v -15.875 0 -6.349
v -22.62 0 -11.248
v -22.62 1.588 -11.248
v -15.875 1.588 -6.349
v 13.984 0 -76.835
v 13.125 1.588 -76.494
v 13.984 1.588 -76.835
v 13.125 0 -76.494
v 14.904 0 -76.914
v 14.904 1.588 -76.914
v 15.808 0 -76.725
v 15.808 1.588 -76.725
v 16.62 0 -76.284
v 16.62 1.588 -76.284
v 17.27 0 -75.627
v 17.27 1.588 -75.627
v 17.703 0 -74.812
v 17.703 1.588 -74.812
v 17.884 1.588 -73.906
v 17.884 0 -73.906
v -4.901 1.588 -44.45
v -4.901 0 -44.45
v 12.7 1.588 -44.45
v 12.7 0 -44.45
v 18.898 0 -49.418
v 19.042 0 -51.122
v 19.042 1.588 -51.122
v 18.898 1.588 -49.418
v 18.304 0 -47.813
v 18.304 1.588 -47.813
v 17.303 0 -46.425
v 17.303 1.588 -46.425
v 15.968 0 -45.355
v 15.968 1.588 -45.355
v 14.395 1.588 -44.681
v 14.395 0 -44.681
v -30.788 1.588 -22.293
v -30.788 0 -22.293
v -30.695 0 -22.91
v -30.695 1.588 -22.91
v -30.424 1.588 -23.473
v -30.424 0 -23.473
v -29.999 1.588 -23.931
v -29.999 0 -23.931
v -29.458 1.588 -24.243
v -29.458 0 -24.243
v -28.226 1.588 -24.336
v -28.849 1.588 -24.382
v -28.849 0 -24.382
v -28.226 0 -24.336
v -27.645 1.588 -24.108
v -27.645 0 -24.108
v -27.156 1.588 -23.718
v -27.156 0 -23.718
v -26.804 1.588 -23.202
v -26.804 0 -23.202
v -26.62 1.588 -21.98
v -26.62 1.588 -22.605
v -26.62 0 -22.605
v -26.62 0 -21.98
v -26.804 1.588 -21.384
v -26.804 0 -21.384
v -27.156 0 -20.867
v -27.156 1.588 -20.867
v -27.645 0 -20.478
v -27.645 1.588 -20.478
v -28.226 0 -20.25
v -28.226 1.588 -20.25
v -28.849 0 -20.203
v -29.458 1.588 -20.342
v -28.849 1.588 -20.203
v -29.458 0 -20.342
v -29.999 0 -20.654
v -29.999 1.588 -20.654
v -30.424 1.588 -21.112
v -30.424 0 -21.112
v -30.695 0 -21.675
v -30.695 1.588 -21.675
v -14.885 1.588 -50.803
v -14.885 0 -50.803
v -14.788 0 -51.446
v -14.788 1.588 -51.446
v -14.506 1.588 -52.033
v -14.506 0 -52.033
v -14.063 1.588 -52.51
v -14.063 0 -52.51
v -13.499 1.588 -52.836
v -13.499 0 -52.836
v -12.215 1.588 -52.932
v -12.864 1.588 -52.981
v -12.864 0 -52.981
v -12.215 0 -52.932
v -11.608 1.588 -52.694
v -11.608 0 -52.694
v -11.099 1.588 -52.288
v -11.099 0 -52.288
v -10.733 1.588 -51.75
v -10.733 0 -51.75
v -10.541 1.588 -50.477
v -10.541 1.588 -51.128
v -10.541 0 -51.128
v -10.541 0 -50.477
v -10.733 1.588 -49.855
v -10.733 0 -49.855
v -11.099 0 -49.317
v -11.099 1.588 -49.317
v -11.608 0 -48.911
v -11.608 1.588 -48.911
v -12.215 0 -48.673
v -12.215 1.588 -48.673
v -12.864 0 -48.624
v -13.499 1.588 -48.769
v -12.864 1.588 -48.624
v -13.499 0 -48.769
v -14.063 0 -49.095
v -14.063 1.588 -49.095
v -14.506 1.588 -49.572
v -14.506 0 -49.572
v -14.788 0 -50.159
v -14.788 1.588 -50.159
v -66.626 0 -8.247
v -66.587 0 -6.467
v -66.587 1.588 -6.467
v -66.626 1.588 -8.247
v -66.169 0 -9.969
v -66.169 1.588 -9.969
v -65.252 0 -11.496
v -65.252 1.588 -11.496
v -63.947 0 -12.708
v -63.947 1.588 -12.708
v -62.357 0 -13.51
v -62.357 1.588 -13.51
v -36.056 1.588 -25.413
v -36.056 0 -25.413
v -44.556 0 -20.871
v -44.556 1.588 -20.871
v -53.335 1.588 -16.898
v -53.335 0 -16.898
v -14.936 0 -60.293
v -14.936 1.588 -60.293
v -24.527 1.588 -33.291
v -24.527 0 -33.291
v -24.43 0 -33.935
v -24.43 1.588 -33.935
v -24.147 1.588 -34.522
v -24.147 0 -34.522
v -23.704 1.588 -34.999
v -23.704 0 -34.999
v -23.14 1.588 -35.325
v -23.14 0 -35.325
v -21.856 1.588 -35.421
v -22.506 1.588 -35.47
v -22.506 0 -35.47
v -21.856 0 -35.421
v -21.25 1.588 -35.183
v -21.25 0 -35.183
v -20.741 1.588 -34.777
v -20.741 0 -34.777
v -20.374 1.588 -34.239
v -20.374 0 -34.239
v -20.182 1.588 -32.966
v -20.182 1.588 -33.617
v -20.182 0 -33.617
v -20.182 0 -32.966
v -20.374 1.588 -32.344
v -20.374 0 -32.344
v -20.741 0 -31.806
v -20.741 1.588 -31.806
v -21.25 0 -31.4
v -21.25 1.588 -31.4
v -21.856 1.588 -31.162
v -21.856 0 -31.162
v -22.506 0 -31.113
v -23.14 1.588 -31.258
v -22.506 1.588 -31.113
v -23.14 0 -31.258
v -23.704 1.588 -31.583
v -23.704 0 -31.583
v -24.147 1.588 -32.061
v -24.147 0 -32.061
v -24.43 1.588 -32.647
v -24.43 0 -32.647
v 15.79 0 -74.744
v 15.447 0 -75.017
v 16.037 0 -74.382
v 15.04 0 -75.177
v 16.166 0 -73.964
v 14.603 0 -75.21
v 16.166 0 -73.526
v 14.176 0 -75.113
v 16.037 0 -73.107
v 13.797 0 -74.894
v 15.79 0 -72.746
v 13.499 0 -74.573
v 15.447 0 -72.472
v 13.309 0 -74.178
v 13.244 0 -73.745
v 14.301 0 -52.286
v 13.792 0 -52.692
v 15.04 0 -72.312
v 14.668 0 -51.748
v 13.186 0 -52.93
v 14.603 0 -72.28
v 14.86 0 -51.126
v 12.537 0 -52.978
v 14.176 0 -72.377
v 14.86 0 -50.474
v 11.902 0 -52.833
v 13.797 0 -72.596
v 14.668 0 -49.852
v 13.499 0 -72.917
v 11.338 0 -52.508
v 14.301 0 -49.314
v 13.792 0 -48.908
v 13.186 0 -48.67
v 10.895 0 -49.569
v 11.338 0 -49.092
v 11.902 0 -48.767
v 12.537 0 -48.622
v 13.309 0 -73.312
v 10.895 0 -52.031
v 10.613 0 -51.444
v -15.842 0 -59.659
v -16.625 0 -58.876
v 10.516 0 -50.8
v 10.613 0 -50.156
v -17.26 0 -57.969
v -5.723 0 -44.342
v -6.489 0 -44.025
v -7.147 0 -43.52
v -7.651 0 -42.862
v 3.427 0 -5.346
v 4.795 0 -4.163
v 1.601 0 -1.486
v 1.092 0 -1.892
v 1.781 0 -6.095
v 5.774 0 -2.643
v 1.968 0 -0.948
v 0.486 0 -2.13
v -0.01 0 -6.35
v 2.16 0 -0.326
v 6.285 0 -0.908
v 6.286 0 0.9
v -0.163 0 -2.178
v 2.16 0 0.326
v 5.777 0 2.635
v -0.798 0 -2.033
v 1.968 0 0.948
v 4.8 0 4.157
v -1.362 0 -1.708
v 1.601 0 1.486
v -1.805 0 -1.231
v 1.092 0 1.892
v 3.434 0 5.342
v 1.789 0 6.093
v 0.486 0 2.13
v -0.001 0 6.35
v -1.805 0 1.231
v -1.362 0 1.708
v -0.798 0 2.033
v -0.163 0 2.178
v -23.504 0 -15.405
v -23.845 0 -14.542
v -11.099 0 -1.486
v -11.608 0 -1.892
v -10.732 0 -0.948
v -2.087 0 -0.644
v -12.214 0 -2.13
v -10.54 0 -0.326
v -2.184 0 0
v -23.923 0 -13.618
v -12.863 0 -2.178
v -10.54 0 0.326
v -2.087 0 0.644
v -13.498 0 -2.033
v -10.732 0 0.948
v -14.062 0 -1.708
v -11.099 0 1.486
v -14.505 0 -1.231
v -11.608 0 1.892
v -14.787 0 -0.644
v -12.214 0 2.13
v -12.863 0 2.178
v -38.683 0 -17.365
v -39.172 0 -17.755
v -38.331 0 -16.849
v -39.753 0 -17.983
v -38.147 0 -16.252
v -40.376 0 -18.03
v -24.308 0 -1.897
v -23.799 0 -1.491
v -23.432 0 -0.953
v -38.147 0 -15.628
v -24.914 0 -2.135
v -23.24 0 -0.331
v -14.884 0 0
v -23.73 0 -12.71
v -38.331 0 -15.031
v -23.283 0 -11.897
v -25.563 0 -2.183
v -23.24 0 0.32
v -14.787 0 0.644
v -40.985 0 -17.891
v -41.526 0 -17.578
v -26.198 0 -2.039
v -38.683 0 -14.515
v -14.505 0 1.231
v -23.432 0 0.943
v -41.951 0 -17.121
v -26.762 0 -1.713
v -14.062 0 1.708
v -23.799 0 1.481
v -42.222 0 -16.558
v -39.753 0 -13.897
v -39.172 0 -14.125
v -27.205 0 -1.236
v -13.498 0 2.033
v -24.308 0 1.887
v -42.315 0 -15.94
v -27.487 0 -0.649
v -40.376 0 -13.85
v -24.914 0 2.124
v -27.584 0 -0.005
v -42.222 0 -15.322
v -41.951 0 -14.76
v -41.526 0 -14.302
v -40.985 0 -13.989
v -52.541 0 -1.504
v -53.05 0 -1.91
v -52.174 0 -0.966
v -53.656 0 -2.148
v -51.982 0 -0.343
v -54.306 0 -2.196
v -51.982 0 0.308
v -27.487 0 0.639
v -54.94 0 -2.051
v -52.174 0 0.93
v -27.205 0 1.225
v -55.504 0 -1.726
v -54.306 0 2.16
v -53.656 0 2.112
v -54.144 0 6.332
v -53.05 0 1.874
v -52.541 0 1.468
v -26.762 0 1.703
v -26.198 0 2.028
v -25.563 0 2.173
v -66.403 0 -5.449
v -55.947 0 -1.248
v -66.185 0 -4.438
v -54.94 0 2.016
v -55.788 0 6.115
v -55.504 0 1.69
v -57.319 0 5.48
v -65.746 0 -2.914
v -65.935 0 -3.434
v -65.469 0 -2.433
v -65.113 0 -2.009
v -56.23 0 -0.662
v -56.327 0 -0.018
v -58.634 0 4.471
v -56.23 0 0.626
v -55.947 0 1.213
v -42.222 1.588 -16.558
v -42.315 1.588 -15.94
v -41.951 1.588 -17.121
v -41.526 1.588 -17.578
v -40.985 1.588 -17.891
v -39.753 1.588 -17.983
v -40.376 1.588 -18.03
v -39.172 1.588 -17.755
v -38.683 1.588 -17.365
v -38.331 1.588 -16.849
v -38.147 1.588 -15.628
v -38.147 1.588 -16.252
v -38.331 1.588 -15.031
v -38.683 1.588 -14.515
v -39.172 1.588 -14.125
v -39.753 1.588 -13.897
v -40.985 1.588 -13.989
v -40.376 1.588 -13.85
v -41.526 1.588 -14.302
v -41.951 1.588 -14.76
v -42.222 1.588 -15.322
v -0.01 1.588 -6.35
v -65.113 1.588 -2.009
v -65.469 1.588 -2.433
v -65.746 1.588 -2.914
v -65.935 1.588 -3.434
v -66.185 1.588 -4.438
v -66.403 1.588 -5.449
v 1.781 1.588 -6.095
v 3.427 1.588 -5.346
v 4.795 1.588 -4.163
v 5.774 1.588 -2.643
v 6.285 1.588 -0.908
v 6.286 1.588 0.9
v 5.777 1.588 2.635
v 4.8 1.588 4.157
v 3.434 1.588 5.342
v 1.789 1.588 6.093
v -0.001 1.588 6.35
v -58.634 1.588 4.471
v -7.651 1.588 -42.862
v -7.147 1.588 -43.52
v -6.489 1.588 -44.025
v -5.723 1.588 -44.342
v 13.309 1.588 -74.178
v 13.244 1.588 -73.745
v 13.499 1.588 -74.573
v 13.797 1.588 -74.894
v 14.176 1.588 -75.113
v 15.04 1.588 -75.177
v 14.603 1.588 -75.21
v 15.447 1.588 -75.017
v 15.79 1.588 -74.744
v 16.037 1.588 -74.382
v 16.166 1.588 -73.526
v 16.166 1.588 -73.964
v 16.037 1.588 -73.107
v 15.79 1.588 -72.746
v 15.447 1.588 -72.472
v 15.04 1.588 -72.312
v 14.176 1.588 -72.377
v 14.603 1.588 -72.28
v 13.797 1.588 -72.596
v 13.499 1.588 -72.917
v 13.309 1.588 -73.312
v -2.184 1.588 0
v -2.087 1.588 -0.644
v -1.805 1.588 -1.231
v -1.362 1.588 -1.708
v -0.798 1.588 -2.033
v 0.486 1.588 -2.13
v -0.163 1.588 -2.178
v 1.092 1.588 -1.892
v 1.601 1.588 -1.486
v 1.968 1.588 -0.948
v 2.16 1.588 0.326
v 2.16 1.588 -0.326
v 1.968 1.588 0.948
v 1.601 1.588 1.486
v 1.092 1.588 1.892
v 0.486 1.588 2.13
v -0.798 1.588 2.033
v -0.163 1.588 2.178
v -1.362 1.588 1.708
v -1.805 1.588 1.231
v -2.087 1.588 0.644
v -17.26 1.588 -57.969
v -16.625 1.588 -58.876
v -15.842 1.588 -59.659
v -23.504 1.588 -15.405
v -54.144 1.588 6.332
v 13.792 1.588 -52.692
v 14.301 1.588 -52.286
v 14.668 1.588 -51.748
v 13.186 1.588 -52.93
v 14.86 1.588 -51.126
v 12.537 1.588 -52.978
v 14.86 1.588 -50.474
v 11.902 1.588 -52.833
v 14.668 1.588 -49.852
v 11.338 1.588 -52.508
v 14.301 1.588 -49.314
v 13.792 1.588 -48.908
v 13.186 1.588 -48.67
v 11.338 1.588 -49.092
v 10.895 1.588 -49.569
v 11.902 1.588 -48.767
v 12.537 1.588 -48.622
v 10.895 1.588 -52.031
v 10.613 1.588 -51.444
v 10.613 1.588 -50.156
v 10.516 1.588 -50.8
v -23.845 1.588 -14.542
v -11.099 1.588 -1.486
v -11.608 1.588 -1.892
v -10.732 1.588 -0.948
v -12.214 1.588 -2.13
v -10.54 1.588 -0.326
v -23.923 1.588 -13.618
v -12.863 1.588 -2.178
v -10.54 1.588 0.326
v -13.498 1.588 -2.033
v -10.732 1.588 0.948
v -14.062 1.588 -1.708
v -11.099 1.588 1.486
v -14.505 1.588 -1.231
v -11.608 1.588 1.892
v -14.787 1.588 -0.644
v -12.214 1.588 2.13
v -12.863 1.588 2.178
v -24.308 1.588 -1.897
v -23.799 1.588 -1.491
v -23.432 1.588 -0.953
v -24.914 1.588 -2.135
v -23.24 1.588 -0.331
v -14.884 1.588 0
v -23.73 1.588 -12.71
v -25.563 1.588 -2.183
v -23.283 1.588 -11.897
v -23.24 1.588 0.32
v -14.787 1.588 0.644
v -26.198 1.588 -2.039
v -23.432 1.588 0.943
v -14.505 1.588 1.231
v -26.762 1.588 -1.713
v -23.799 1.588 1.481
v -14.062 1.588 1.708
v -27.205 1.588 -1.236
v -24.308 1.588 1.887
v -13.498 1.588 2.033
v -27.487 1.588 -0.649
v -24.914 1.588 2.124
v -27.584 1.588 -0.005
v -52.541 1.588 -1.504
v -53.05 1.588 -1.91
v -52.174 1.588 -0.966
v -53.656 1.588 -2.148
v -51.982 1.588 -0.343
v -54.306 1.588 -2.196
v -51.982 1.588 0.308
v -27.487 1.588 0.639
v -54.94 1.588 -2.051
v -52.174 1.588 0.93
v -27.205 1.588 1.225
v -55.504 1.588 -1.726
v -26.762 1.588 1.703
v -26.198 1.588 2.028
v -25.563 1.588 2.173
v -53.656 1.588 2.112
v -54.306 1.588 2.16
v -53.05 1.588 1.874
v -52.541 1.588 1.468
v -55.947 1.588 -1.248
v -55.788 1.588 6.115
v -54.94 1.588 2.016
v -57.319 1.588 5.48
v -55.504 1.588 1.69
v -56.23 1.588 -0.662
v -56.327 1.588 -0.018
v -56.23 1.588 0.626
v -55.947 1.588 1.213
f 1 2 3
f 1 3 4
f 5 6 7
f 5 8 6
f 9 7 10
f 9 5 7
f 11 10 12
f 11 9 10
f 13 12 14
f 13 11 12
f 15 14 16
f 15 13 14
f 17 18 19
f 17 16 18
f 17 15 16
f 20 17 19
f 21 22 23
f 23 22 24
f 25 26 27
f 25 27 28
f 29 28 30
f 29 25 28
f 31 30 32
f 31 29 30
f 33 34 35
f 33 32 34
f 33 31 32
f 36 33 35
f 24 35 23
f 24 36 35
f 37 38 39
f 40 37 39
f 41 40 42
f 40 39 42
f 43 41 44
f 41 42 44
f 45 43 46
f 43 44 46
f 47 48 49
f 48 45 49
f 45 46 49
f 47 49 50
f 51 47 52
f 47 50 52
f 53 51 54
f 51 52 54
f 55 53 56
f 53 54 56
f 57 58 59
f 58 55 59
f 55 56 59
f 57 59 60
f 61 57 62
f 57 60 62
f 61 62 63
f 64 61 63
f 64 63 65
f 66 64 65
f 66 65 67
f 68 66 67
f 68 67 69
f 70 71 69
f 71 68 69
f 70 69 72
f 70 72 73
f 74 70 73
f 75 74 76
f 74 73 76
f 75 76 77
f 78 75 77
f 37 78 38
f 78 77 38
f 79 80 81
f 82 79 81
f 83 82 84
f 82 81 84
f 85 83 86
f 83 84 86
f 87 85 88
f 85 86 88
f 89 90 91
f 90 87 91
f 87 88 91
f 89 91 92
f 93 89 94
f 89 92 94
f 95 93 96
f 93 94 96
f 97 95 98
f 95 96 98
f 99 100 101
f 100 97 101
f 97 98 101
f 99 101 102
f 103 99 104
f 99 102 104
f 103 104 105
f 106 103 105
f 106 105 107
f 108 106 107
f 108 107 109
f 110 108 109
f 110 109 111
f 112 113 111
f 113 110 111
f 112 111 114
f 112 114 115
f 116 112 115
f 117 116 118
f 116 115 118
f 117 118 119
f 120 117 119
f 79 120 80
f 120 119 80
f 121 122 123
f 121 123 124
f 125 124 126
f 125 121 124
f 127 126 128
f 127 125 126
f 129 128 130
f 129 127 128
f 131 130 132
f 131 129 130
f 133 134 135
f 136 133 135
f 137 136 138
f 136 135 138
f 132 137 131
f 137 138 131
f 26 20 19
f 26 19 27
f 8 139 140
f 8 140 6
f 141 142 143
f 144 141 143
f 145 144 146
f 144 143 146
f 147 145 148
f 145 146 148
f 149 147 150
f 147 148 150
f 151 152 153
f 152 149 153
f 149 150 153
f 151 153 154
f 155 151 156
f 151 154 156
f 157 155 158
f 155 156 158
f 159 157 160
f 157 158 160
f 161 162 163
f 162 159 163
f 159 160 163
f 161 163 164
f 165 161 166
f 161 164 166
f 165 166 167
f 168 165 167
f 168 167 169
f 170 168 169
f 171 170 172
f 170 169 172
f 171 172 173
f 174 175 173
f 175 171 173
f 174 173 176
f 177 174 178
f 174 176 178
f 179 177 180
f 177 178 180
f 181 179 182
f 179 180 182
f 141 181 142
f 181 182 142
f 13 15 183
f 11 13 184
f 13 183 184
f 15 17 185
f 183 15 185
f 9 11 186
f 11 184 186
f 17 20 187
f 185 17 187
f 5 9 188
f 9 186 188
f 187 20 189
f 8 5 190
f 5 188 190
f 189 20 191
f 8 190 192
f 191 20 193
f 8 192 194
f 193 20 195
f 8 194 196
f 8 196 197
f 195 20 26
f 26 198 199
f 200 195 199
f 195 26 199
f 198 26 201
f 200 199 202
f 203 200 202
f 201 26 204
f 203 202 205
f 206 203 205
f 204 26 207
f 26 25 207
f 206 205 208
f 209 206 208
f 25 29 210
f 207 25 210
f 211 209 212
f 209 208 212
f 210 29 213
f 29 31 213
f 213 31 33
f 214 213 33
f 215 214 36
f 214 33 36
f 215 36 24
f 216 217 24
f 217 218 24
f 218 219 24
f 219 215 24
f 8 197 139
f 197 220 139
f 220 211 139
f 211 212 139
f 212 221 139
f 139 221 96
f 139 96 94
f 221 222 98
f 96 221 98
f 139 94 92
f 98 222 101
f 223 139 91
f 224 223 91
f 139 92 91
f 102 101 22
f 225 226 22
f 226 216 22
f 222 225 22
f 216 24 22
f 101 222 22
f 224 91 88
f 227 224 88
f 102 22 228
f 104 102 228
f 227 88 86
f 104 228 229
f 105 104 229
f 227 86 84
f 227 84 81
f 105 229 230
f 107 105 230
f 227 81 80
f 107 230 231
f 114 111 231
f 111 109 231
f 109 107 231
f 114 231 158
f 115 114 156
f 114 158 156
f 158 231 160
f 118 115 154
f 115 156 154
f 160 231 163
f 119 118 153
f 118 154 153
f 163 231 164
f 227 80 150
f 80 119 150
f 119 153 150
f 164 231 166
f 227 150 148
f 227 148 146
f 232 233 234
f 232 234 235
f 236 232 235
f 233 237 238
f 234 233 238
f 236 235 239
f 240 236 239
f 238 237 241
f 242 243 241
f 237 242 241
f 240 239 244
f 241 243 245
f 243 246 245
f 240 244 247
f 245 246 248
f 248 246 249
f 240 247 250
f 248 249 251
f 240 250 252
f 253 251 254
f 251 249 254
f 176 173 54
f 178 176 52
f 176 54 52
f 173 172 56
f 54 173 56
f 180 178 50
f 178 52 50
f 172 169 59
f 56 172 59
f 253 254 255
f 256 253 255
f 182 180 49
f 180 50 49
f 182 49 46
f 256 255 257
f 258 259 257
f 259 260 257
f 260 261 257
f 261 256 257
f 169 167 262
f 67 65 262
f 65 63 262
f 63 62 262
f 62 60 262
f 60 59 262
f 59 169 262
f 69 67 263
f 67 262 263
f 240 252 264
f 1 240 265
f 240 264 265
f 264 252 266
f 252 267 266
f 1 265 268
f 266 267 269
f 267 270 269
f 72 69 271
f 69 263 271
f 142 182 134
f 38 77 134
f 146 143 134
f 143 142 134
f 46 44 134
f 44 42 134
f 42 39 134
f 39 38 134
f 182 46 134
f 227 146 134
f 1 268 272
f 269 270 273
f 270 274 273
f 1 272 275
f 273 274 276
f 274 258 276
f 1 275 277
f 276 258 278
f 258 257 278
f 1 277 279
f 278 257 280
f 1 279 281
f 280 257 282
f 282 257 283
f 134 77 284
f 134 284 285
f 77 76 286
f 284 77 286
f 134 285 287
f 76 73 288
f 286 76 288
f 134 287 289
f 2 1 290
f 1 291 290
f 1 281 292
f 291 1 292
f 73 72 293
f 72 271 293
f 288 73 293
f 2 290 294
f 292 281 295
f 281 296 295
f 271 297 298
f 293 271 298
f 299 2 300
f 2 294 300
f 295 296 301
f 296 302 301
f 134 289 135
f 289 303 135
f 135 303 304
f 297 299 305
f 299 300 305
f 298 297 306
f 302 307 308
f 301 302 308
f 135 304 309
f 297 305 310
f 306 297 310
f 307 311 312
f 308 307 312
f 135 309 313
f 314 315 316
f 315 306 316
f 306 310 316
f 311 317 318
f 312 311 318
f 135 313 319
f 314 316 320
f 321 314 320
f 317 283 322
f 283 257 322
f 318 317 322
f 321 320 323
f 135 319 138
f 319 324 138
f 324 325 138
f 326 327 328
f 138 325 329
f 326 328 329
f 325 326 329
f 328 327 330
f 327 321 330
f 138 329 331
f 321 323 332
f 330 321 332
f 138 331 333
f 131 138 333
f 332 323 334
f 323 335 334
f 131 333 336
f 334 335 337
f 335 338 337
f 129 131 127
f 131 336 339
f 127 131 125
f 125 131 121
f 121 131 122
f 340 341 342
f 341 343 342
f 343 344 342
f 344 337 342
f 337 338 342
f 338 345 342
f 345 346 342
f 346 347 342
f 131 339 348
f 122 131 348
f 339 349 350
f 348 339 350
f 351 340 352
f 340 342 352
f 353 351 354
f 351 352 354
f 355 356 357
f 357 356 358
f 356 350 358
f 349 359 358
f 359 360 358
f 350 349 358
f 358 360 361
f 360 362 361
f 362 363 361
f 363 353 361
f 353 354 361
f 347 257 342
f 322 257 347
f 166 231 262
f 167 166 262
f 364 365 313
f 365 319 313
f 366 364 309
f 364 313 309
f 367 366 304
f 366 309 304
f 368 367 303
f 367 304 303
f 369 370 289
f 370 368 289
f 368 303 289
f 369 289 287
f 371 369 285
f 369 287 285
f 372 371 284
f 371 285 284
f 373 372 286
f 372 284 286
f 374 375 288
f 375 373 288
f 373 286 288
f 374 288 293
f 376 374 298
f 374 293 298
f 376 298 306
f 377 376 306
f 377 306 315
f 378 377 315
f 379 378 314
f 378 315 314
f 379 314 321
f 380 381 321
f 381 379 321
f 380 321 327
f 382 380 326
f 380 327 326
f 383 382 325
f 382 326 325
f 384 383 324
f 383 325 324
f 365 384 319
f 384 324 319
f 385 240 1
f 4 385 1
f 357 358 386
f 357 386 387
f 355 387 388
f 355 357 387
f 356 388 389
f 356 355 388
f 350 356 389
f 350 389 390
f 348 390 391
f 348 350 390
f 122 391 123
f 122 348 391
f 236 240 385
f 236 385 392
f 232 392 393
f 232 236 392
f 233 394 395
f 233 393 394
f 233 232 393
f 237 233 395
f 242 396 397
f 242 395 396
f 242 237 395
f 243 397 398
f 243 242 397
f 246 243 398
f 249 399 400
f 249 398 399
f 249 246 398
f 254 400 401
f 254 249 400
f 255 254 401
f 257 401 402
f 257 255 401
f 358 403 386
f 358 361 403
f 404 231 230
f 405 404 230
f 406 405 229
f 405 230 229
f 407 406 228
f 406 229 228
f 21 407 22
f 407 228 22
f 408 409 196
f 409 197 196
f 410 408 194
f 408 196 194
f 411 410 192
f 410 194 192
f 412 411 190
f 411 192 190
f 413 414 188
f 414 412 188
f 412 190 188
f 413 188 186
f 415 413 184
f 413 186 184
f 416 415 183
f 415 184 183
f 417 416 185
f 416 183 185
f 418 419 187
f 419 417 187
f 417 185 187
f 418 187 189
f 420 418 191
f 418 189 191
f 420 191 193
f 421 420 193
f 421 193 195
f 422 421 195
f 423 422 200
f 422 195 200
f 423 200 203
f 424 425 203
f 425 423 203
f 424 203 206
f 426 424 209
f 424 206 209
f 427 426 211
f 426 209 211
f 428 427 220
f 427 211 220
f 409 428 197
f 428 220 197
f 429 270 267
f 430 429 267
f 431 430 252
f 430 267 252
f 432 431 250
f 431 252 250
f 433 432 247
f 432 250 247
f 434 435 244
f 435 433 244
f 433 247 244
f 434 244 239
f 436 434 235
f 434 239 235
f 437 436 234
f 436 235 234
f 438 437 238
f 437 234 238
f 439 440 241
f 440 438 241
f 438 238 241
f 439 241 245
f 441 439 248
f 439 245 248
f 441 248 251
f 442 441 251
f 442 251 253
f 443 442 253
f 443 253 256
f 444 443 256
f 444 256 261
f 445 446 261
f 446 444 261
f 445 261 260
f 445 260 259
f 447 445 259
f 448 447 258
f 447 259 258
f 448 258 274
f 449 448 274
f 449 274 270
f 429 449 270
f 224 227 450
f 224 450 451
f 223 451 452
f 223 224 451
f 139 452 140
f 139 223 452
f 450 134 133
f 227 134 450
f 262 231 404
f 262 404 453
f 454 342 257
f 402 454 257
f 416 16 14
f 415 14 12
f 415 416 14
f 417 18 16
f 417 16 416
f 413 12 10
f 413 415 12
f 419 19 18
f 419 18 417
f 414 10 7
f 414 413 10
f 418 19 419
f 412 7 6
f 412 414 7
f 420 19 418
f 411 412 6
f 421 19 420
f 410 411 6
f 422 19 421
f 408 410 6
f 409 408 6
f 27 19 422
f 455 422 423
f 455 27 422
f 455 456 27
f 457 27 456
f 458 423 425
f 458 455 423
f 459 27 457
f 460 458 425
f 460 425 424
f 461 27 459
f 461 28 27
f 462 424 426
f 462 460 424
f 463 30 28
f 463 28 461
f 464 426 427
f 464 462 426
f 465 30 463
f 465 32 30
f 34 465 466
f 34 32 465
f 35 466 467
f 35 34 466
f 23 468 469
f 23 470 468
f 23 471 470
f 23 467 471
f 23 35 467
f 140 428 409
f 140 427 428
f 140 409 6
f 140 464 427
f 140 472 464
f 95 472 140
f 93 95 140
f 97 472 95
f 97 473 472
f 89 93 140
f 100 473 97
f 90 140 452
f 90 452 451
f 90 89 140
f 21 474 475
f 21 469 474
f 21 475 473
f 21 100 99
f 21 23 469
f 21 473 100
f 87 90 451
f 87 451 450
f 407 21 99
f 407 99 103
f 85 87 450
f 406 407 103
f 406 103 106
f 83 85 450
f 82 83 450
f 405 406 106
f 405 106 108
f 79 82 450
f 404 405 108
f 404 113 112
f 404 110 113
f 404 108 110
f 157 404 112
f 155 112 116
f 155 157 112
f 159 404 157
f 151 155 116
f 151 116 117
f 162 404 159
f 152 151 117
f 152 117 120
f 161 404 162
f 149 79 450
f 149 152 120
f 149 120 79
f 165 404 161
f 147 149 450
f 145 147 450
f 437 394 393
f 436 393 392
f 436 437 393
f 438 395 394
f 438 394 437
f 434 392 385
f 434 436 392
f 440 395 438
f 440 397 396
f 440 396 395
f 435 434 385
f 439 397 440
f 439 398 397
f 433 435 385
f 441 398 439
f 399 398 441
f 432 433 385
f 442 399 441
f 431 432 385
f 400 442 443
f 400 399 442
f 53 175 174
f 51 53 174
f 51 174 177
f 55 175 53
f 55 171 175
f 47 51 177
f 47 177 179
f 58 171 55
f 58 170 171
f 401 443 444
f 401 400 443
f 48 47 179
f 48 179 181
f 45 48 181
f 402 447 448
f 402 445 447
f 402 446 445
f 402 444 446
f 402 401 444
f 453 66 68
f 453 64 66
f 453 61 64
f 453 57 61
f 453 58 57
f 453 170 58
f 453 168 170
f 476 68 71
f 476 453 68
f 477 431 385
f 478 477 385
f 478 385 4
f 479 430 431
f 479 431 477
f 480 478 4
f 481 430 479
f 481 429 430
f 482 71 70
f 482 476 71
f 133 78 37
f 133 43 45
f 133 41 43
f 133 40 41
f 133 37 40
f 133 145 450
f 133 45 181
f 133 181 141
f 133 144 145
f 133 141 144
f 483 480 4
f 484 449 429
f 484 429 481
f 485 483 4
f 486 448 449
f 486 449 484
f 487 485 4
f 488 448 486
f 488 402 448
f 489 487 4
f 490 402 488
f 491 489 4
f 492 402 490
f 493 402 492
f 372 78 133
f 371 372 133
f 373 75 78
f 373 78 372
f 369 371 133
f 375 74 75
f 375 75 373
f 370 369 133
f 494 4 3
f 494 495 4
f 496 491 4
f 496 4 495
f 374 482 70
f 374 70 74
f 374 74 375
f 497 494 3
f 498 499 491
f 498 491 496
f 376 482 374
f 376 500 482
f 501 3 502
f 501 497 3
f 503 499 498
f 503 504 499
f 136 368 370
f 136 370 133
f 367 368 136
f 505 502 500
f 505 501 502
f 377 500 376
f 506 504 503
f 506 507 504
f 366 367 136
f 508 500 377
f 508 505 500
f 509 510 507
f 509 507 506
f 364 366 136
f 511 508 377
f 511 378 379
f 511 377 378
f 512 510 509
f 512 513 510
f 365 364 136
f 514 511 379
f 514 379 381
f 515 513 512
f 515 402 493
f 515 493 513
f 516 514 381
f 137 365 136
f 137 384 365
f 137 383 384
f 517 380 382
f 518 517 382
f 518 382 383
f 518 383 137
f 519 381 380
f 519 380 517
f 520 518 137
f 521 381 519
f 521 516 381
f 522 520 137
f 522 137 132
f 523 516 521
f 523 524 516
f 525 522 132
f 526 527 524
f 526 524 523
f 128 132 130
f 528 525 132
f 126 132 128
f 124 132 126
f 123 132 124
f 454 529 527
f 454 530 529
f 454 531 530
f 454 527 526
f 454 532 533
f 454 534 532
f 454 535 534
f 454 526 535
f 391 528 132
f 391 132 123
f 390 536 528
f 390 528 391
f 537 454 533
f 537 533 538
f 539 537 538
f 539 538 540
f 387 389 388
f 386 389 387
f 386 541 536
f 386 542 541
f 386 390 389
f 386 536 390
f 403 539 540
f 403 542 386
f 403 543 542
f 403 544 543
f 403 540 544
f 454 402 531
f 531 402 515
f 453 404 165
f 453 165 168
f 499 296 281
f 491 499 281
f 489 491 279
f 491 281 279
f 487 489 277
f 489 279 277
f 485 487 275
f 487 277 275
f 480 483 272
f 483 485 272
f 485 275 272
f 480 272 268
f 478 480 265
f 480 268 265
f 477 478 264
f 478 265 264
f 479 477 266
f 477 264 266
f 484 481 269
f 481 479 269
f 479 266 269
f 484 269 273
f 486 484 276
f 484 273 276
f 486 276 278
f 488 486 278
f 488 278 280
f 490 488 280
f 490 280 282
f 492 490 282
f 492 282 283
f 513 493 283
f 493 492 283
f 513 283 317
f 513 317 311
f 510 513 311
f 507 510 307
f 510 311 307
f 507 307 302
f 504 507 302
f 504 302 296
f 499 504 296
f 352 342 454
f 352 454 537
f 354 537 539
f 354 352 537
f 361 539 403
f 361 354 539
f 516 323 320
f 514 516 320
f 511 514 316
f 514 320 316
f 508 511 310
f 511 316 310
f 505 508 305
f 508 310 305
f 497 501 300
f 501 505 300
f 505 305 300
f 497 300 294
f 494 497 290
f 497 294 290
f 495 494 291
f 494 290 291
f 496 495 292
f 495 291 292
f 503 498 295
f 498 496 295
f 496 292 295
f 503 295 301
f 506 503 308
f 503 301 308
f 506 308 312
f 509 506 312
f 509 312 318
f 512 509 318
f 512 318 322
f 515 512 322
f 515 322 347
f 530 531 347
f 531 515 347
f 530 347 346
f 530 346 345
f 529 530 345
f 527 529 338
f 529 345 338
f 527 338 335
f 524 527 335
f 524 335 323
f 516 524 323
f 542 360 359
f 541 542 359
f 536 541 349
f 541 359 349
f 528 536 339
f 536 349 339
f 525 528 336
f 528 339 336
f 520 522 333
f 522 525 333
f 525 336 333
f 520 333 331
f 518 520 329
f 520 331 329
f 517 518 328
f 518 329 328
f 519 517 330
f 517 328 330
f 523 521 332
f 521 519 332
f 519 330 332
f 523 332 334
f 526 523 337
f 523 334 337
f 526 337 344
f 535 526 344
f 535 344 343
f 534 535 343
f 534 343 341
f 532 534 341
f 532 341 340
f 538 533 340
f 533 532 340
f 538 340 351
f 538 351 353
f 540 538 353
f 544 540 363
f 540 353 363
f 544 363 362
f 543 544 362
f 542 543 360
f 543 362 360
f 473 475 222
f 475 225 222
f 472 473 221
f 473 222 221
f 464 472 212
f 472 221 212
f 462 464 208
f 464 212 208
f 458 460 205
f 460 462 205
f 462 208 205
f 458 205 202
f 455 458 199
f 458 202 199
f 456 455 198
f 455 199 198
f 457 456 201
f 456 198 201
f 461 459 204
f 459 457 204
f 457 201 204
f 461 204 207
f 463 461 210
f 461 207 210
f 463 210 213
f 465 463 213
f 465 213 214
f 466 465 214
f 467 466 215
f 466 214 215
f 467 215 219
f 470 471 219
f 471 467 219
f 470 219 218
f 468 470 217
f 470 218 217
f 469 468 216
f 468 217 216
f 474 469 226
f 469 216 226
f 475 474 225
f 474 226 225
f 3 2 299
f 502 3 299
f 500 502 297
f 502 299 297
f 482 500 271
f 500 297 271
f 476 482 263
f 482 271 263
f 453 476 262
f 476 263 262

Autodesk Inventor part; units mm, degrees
ref_plane "YZ Plane" through (0, 0, 0) normal (1, 0, 0) x (0, 1, 0)
ref_plane "XZ Plane" through (0, 0, 0) normal (0, 1, 0) x (-1, 0, 0)
ref_plane "XY Plane" through (0, 0, 0) normal (0, 0, 1) x (1, 0, 0)
sketch "main" plane through (0, 0, 0) normal (0, 0, 1) x (1, 0, 0)
  circle A0 centre (36.4896, 64.2776) radius 2.1844
  line L0 (36.4904, 70.6276) -> (-17.6528, 70.6344)
  circle A1 centre (7.7473, 64.2844) radius 2.1844
  line L1 (-17.6416, 57.9344) -> (-1.7768, 57.9386)
  arc A2 (-17.6528, 70.6344) -> (-17.6416, 57.9344) centre (-17.6528, 64.2844) ccw
  circle A3 centre (-17.6528, 64.2844) radius 2.1844
  arc A4 (40.98, 68.7674) -> (36.4904, 70.6276) centre (36.4896, 64.2776) ccw
  line L2 (40.98, 68.7674) -> (49.8505, 68.7674) construction
  circle A5 centre (-4.9416, 13.4844) radius 2.1844
  circle A6 centre (-4.9528, 64.287) radius 2.1844
  point P0 (10.5119, 26.5593)
  point P1 (34.4277, 26.6577)
  dimension "d2" = 4.3688
  dimension "d3" = 4.3688
  dimension "d13" = 6.35
  dimension "d78" = 4.3688
sketch "mogo" plane through (0, 0, 0) normal (0, 0, 1) x (1, 0, 0)
  line L0 (-61.3822, 498.7735) -> (65.6178, 572.097)
  line L1 (65.6178, 572.097) -> (192.6178, 498.7735)
  line L2 (192.6178, 498.7735) -> (192.6178, 352.1265)
  line L3 (192.6178, 352.1265) -> (65.6178, 278.803)
  line L4 (65.6178, 278.803) -> (-61.3822, 352.1265)
  line L5 (-61.3822, 352.1265) -> (-61.3822, 498.7735)
  point P0 (65.6178, 425.45)
  point P1 (65.6178, 425.45)
  dimension "d59" = 254
sketch "Sketch1" plane through (0, 0, 0) normal (0, 1, 0) x (-1, 0, 0)
  line L0 (58.6337, 4.471) -> (65.1127, -2.0089)
  arc A0 (65.935, -3.4345) -> (65.1127, -2.0089) centre (62.8675, -4.2538) ccw
  circle A1 centre (22.3424, -33.2913) radius 2.1844
  arc A2 (66.587, -6.4669) -> (65.935, -3.4345) centre (35.461, -11.5736) ccw
  arc A3 (62.3569, -13.5096) -> (66.587, -6.4669) centre (60.3208, -7.4949) ccw
  line L1 (31.7488, -5.4171) -> (31.751, 4.6095) projected
  arc A4 (62.3569, -13.5096) -> (36.0563, -25.4131) centre (109.3798, -152.4131) ccw
  line L2 (36.0563, -25.4131) -> (17.2601, -57.9692)
  line L3 (7.6511, -42.8625) -> (23.5038, -15.4048)
  line L4 (49.7771, -4.633) -> (49.6408, -4.4967)
  line L5 (4.9014, -44.45) -> (-12.7, -44.45)
  line L6 (-17.8837, -73.9061) -> (-19.0418, -51.1224)
  line L7 (14.9358, -60.2934) -> (-13.1253, -76.4945)
  circle A5 centre (-12.7, -50.8) radius 2.1844
  arc A6 (-12.7, -44.45) -> (-19.0418, -51.1224) centre (-12.7, -50.8) ccw
  arc A7 (-17.8837, -73.9061) -> (-13.1253, -76.4945) centre (-14.7128, -73.7449) ccw
  circle A8 centre (-14.7128, -73.7449) radius 1.4693
  arc A9 (14.9358, -60.2934) -> (17.2601, -57.9692) centre (11.7608, -54.7942) ccw
  circle A10 centre (28.6924, -22.2928) radius 2.0955
  line L8 (22.62, -11.2484) -> (15.8746, -6.349)
  arc A11 (23.5038, -15.4048) -> (22.62, -11.2484) centre (20.7541, -13.8173) ccw
  circle A12 centre (40.2193, -15.9401) radius 2.0955
  arc A13 (4.9014, -44.45) -> (7.6511, -42.8625) centre (4.9014, -41.275) ccw
  circle A14 centre (54.1423, -0.0179) radius 2.1844
  line L9 (54.1445, 6.3321) -> (0.0013, 6.35)
  circle A15 centre (25.4, -0.0052) radius 2.1844
  line L10 (0.0098, -6.35) -> (15.8746, -6.349)
  arc A16 (0.0013, 6.35) -> (0.0098, -6.35) centre (0, 0) ccw
  circle A17 centre (0, 0) radius 2.1844
  arc A18 (58.6337, 4.471) -> (54.1445, 6.3321) centre (54.1423, -0.0179) ccw
  line L11 (58.6337, 4.471) -> (67.5042, 4.4692) construction
  circle A19 centre (12.7007, -50.8026) radius 2.1844
  circle A20 centre (12.7, 0) radius 2.1844
  point P0 (0, 0)
  point P1 (65.6981, -2.5943)
  point P2 (58.6337, 4.471)
  point P3 (-17.6202, -79.0897)
  point P4 (16.4093, -59.4427)
  point P5 (15.8746, -6.349)
  dimension "d41" = 3.175
  dimension "d54" = 4.3688
  dimension "d60" = 6.35
  dimension "d64" = 15.875
  dimension "d65" = 4.3688
  dimension "d66" = 12.7
  dimension "d67" = 3.175
  dimension "d68" = 6.35
  dimension "d69" = 4.191
  dimension "d70" = 7.9375
  dimension "d71" = 12.7
  dimension "d72" = 7.9375
  dimension "d75" = 3.175
  dimension "d76" = 4.191
  dimension "d77" = 3.175
extrude "Extrusion1" add sketch "Sketch1" along normal blind 1.5875
properties part number "Funnel Gusset Back Improved V2" material "Acetal Resin, White"
